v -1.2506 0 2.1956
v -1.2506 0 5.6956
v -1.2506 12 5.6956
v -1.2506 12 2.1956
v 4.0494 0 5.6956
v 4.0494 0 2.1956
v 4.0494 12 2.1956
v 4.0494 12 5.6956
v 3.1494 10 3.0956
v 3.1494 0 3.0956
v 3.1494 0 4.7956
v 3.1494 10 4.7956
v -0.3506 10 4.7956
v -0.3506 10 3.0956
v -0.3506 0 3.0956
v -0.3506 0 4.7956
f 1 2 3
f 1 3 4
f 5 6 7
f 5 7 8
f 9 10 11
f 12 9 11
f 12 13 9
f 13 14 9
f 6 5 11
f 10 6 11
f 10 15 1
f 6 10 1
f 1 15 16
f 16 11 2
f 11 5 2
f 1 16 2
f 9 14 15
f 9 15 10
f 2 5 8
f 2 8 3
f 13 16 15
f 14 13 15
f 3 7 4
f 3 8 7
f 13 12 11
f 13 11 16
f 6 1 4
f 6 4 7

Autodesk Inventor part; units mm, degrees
ref_plane "YZ Plane" through (0, 0, 0) normal (1, 0, 0) x (0, 1, 0)
ref_plane "XZ Plane" through (0, 0, 0) normal (0, 1, 0) x (-1, 0, 0)
ref_plane "XY Plane" through (0, 0, 0) normal (0, 0, 1) x (1, 0, 0)
sketch "Esquisse1" plane through (0, 0, 0) normal (0, 1, 0) x (-1, 0, 0)
  line L0 (-3.1494, 4.7956) -> (0.3506, 4.7956)
  line L1 (0.3506, 4.7956) -> (0.3506, 3.0956)
  line L2 (0.3506, 3.0956) -> (-3.1494, 3.0956)
  line L3 (-3.1494, 3.0956) -> (-3.1494, 4.7956)
  line L4 (-4.0494, 5.6956) -> (1.2506, 5.6956)
  line L5 (1.2506, 5.6956) -> (1.2506, 2.1956)
  line L6 (1.2506, 2.1956) -> (-4.0494, 2.1956)
  line L7 (-4.0494, 2.1956) -> (-4.0494, 5.6956)
  point P0 (0, 0)
  dimension "d0" = 3.5
  dimension "d1" = 1.7
  dimension "d2" = 0.9
  dimension "d3" = 0.9
  dimension "d4" = 0.9
  dimension "d5" = 0.9
extrude "Extrusion1" add sketch "Esquisse1" along normal blind 12
sketch "Esquisse2" plane through (0, 12, 0) normal (0, 1, 0) x (1, 0, 0)
  line L0 (3.1494, -4.7956) -> (-0.3506, -4.7956) projected
  line L1 (-0.3506, -4.7956) -> (3.1494, -4.7956)
  line L2 (3.1494, -4.7956) -> (3.1494, -3.0956)
  line L3 (3.1494, -3.0956) -> (-0.3506, -3.0956)
  line L4 (-0.3506, -3.0956) -> (-0.3506, -4.7956)
  point P0 (0, 0)
extrude "Extrusion2" add sketch "Esquisse2" against normal blind 2
equation "\"d3\" = d2"
equation "\"d4\" = d2"
equation "\"d5\" = d2"
properties part number "SwitchOnOff"
